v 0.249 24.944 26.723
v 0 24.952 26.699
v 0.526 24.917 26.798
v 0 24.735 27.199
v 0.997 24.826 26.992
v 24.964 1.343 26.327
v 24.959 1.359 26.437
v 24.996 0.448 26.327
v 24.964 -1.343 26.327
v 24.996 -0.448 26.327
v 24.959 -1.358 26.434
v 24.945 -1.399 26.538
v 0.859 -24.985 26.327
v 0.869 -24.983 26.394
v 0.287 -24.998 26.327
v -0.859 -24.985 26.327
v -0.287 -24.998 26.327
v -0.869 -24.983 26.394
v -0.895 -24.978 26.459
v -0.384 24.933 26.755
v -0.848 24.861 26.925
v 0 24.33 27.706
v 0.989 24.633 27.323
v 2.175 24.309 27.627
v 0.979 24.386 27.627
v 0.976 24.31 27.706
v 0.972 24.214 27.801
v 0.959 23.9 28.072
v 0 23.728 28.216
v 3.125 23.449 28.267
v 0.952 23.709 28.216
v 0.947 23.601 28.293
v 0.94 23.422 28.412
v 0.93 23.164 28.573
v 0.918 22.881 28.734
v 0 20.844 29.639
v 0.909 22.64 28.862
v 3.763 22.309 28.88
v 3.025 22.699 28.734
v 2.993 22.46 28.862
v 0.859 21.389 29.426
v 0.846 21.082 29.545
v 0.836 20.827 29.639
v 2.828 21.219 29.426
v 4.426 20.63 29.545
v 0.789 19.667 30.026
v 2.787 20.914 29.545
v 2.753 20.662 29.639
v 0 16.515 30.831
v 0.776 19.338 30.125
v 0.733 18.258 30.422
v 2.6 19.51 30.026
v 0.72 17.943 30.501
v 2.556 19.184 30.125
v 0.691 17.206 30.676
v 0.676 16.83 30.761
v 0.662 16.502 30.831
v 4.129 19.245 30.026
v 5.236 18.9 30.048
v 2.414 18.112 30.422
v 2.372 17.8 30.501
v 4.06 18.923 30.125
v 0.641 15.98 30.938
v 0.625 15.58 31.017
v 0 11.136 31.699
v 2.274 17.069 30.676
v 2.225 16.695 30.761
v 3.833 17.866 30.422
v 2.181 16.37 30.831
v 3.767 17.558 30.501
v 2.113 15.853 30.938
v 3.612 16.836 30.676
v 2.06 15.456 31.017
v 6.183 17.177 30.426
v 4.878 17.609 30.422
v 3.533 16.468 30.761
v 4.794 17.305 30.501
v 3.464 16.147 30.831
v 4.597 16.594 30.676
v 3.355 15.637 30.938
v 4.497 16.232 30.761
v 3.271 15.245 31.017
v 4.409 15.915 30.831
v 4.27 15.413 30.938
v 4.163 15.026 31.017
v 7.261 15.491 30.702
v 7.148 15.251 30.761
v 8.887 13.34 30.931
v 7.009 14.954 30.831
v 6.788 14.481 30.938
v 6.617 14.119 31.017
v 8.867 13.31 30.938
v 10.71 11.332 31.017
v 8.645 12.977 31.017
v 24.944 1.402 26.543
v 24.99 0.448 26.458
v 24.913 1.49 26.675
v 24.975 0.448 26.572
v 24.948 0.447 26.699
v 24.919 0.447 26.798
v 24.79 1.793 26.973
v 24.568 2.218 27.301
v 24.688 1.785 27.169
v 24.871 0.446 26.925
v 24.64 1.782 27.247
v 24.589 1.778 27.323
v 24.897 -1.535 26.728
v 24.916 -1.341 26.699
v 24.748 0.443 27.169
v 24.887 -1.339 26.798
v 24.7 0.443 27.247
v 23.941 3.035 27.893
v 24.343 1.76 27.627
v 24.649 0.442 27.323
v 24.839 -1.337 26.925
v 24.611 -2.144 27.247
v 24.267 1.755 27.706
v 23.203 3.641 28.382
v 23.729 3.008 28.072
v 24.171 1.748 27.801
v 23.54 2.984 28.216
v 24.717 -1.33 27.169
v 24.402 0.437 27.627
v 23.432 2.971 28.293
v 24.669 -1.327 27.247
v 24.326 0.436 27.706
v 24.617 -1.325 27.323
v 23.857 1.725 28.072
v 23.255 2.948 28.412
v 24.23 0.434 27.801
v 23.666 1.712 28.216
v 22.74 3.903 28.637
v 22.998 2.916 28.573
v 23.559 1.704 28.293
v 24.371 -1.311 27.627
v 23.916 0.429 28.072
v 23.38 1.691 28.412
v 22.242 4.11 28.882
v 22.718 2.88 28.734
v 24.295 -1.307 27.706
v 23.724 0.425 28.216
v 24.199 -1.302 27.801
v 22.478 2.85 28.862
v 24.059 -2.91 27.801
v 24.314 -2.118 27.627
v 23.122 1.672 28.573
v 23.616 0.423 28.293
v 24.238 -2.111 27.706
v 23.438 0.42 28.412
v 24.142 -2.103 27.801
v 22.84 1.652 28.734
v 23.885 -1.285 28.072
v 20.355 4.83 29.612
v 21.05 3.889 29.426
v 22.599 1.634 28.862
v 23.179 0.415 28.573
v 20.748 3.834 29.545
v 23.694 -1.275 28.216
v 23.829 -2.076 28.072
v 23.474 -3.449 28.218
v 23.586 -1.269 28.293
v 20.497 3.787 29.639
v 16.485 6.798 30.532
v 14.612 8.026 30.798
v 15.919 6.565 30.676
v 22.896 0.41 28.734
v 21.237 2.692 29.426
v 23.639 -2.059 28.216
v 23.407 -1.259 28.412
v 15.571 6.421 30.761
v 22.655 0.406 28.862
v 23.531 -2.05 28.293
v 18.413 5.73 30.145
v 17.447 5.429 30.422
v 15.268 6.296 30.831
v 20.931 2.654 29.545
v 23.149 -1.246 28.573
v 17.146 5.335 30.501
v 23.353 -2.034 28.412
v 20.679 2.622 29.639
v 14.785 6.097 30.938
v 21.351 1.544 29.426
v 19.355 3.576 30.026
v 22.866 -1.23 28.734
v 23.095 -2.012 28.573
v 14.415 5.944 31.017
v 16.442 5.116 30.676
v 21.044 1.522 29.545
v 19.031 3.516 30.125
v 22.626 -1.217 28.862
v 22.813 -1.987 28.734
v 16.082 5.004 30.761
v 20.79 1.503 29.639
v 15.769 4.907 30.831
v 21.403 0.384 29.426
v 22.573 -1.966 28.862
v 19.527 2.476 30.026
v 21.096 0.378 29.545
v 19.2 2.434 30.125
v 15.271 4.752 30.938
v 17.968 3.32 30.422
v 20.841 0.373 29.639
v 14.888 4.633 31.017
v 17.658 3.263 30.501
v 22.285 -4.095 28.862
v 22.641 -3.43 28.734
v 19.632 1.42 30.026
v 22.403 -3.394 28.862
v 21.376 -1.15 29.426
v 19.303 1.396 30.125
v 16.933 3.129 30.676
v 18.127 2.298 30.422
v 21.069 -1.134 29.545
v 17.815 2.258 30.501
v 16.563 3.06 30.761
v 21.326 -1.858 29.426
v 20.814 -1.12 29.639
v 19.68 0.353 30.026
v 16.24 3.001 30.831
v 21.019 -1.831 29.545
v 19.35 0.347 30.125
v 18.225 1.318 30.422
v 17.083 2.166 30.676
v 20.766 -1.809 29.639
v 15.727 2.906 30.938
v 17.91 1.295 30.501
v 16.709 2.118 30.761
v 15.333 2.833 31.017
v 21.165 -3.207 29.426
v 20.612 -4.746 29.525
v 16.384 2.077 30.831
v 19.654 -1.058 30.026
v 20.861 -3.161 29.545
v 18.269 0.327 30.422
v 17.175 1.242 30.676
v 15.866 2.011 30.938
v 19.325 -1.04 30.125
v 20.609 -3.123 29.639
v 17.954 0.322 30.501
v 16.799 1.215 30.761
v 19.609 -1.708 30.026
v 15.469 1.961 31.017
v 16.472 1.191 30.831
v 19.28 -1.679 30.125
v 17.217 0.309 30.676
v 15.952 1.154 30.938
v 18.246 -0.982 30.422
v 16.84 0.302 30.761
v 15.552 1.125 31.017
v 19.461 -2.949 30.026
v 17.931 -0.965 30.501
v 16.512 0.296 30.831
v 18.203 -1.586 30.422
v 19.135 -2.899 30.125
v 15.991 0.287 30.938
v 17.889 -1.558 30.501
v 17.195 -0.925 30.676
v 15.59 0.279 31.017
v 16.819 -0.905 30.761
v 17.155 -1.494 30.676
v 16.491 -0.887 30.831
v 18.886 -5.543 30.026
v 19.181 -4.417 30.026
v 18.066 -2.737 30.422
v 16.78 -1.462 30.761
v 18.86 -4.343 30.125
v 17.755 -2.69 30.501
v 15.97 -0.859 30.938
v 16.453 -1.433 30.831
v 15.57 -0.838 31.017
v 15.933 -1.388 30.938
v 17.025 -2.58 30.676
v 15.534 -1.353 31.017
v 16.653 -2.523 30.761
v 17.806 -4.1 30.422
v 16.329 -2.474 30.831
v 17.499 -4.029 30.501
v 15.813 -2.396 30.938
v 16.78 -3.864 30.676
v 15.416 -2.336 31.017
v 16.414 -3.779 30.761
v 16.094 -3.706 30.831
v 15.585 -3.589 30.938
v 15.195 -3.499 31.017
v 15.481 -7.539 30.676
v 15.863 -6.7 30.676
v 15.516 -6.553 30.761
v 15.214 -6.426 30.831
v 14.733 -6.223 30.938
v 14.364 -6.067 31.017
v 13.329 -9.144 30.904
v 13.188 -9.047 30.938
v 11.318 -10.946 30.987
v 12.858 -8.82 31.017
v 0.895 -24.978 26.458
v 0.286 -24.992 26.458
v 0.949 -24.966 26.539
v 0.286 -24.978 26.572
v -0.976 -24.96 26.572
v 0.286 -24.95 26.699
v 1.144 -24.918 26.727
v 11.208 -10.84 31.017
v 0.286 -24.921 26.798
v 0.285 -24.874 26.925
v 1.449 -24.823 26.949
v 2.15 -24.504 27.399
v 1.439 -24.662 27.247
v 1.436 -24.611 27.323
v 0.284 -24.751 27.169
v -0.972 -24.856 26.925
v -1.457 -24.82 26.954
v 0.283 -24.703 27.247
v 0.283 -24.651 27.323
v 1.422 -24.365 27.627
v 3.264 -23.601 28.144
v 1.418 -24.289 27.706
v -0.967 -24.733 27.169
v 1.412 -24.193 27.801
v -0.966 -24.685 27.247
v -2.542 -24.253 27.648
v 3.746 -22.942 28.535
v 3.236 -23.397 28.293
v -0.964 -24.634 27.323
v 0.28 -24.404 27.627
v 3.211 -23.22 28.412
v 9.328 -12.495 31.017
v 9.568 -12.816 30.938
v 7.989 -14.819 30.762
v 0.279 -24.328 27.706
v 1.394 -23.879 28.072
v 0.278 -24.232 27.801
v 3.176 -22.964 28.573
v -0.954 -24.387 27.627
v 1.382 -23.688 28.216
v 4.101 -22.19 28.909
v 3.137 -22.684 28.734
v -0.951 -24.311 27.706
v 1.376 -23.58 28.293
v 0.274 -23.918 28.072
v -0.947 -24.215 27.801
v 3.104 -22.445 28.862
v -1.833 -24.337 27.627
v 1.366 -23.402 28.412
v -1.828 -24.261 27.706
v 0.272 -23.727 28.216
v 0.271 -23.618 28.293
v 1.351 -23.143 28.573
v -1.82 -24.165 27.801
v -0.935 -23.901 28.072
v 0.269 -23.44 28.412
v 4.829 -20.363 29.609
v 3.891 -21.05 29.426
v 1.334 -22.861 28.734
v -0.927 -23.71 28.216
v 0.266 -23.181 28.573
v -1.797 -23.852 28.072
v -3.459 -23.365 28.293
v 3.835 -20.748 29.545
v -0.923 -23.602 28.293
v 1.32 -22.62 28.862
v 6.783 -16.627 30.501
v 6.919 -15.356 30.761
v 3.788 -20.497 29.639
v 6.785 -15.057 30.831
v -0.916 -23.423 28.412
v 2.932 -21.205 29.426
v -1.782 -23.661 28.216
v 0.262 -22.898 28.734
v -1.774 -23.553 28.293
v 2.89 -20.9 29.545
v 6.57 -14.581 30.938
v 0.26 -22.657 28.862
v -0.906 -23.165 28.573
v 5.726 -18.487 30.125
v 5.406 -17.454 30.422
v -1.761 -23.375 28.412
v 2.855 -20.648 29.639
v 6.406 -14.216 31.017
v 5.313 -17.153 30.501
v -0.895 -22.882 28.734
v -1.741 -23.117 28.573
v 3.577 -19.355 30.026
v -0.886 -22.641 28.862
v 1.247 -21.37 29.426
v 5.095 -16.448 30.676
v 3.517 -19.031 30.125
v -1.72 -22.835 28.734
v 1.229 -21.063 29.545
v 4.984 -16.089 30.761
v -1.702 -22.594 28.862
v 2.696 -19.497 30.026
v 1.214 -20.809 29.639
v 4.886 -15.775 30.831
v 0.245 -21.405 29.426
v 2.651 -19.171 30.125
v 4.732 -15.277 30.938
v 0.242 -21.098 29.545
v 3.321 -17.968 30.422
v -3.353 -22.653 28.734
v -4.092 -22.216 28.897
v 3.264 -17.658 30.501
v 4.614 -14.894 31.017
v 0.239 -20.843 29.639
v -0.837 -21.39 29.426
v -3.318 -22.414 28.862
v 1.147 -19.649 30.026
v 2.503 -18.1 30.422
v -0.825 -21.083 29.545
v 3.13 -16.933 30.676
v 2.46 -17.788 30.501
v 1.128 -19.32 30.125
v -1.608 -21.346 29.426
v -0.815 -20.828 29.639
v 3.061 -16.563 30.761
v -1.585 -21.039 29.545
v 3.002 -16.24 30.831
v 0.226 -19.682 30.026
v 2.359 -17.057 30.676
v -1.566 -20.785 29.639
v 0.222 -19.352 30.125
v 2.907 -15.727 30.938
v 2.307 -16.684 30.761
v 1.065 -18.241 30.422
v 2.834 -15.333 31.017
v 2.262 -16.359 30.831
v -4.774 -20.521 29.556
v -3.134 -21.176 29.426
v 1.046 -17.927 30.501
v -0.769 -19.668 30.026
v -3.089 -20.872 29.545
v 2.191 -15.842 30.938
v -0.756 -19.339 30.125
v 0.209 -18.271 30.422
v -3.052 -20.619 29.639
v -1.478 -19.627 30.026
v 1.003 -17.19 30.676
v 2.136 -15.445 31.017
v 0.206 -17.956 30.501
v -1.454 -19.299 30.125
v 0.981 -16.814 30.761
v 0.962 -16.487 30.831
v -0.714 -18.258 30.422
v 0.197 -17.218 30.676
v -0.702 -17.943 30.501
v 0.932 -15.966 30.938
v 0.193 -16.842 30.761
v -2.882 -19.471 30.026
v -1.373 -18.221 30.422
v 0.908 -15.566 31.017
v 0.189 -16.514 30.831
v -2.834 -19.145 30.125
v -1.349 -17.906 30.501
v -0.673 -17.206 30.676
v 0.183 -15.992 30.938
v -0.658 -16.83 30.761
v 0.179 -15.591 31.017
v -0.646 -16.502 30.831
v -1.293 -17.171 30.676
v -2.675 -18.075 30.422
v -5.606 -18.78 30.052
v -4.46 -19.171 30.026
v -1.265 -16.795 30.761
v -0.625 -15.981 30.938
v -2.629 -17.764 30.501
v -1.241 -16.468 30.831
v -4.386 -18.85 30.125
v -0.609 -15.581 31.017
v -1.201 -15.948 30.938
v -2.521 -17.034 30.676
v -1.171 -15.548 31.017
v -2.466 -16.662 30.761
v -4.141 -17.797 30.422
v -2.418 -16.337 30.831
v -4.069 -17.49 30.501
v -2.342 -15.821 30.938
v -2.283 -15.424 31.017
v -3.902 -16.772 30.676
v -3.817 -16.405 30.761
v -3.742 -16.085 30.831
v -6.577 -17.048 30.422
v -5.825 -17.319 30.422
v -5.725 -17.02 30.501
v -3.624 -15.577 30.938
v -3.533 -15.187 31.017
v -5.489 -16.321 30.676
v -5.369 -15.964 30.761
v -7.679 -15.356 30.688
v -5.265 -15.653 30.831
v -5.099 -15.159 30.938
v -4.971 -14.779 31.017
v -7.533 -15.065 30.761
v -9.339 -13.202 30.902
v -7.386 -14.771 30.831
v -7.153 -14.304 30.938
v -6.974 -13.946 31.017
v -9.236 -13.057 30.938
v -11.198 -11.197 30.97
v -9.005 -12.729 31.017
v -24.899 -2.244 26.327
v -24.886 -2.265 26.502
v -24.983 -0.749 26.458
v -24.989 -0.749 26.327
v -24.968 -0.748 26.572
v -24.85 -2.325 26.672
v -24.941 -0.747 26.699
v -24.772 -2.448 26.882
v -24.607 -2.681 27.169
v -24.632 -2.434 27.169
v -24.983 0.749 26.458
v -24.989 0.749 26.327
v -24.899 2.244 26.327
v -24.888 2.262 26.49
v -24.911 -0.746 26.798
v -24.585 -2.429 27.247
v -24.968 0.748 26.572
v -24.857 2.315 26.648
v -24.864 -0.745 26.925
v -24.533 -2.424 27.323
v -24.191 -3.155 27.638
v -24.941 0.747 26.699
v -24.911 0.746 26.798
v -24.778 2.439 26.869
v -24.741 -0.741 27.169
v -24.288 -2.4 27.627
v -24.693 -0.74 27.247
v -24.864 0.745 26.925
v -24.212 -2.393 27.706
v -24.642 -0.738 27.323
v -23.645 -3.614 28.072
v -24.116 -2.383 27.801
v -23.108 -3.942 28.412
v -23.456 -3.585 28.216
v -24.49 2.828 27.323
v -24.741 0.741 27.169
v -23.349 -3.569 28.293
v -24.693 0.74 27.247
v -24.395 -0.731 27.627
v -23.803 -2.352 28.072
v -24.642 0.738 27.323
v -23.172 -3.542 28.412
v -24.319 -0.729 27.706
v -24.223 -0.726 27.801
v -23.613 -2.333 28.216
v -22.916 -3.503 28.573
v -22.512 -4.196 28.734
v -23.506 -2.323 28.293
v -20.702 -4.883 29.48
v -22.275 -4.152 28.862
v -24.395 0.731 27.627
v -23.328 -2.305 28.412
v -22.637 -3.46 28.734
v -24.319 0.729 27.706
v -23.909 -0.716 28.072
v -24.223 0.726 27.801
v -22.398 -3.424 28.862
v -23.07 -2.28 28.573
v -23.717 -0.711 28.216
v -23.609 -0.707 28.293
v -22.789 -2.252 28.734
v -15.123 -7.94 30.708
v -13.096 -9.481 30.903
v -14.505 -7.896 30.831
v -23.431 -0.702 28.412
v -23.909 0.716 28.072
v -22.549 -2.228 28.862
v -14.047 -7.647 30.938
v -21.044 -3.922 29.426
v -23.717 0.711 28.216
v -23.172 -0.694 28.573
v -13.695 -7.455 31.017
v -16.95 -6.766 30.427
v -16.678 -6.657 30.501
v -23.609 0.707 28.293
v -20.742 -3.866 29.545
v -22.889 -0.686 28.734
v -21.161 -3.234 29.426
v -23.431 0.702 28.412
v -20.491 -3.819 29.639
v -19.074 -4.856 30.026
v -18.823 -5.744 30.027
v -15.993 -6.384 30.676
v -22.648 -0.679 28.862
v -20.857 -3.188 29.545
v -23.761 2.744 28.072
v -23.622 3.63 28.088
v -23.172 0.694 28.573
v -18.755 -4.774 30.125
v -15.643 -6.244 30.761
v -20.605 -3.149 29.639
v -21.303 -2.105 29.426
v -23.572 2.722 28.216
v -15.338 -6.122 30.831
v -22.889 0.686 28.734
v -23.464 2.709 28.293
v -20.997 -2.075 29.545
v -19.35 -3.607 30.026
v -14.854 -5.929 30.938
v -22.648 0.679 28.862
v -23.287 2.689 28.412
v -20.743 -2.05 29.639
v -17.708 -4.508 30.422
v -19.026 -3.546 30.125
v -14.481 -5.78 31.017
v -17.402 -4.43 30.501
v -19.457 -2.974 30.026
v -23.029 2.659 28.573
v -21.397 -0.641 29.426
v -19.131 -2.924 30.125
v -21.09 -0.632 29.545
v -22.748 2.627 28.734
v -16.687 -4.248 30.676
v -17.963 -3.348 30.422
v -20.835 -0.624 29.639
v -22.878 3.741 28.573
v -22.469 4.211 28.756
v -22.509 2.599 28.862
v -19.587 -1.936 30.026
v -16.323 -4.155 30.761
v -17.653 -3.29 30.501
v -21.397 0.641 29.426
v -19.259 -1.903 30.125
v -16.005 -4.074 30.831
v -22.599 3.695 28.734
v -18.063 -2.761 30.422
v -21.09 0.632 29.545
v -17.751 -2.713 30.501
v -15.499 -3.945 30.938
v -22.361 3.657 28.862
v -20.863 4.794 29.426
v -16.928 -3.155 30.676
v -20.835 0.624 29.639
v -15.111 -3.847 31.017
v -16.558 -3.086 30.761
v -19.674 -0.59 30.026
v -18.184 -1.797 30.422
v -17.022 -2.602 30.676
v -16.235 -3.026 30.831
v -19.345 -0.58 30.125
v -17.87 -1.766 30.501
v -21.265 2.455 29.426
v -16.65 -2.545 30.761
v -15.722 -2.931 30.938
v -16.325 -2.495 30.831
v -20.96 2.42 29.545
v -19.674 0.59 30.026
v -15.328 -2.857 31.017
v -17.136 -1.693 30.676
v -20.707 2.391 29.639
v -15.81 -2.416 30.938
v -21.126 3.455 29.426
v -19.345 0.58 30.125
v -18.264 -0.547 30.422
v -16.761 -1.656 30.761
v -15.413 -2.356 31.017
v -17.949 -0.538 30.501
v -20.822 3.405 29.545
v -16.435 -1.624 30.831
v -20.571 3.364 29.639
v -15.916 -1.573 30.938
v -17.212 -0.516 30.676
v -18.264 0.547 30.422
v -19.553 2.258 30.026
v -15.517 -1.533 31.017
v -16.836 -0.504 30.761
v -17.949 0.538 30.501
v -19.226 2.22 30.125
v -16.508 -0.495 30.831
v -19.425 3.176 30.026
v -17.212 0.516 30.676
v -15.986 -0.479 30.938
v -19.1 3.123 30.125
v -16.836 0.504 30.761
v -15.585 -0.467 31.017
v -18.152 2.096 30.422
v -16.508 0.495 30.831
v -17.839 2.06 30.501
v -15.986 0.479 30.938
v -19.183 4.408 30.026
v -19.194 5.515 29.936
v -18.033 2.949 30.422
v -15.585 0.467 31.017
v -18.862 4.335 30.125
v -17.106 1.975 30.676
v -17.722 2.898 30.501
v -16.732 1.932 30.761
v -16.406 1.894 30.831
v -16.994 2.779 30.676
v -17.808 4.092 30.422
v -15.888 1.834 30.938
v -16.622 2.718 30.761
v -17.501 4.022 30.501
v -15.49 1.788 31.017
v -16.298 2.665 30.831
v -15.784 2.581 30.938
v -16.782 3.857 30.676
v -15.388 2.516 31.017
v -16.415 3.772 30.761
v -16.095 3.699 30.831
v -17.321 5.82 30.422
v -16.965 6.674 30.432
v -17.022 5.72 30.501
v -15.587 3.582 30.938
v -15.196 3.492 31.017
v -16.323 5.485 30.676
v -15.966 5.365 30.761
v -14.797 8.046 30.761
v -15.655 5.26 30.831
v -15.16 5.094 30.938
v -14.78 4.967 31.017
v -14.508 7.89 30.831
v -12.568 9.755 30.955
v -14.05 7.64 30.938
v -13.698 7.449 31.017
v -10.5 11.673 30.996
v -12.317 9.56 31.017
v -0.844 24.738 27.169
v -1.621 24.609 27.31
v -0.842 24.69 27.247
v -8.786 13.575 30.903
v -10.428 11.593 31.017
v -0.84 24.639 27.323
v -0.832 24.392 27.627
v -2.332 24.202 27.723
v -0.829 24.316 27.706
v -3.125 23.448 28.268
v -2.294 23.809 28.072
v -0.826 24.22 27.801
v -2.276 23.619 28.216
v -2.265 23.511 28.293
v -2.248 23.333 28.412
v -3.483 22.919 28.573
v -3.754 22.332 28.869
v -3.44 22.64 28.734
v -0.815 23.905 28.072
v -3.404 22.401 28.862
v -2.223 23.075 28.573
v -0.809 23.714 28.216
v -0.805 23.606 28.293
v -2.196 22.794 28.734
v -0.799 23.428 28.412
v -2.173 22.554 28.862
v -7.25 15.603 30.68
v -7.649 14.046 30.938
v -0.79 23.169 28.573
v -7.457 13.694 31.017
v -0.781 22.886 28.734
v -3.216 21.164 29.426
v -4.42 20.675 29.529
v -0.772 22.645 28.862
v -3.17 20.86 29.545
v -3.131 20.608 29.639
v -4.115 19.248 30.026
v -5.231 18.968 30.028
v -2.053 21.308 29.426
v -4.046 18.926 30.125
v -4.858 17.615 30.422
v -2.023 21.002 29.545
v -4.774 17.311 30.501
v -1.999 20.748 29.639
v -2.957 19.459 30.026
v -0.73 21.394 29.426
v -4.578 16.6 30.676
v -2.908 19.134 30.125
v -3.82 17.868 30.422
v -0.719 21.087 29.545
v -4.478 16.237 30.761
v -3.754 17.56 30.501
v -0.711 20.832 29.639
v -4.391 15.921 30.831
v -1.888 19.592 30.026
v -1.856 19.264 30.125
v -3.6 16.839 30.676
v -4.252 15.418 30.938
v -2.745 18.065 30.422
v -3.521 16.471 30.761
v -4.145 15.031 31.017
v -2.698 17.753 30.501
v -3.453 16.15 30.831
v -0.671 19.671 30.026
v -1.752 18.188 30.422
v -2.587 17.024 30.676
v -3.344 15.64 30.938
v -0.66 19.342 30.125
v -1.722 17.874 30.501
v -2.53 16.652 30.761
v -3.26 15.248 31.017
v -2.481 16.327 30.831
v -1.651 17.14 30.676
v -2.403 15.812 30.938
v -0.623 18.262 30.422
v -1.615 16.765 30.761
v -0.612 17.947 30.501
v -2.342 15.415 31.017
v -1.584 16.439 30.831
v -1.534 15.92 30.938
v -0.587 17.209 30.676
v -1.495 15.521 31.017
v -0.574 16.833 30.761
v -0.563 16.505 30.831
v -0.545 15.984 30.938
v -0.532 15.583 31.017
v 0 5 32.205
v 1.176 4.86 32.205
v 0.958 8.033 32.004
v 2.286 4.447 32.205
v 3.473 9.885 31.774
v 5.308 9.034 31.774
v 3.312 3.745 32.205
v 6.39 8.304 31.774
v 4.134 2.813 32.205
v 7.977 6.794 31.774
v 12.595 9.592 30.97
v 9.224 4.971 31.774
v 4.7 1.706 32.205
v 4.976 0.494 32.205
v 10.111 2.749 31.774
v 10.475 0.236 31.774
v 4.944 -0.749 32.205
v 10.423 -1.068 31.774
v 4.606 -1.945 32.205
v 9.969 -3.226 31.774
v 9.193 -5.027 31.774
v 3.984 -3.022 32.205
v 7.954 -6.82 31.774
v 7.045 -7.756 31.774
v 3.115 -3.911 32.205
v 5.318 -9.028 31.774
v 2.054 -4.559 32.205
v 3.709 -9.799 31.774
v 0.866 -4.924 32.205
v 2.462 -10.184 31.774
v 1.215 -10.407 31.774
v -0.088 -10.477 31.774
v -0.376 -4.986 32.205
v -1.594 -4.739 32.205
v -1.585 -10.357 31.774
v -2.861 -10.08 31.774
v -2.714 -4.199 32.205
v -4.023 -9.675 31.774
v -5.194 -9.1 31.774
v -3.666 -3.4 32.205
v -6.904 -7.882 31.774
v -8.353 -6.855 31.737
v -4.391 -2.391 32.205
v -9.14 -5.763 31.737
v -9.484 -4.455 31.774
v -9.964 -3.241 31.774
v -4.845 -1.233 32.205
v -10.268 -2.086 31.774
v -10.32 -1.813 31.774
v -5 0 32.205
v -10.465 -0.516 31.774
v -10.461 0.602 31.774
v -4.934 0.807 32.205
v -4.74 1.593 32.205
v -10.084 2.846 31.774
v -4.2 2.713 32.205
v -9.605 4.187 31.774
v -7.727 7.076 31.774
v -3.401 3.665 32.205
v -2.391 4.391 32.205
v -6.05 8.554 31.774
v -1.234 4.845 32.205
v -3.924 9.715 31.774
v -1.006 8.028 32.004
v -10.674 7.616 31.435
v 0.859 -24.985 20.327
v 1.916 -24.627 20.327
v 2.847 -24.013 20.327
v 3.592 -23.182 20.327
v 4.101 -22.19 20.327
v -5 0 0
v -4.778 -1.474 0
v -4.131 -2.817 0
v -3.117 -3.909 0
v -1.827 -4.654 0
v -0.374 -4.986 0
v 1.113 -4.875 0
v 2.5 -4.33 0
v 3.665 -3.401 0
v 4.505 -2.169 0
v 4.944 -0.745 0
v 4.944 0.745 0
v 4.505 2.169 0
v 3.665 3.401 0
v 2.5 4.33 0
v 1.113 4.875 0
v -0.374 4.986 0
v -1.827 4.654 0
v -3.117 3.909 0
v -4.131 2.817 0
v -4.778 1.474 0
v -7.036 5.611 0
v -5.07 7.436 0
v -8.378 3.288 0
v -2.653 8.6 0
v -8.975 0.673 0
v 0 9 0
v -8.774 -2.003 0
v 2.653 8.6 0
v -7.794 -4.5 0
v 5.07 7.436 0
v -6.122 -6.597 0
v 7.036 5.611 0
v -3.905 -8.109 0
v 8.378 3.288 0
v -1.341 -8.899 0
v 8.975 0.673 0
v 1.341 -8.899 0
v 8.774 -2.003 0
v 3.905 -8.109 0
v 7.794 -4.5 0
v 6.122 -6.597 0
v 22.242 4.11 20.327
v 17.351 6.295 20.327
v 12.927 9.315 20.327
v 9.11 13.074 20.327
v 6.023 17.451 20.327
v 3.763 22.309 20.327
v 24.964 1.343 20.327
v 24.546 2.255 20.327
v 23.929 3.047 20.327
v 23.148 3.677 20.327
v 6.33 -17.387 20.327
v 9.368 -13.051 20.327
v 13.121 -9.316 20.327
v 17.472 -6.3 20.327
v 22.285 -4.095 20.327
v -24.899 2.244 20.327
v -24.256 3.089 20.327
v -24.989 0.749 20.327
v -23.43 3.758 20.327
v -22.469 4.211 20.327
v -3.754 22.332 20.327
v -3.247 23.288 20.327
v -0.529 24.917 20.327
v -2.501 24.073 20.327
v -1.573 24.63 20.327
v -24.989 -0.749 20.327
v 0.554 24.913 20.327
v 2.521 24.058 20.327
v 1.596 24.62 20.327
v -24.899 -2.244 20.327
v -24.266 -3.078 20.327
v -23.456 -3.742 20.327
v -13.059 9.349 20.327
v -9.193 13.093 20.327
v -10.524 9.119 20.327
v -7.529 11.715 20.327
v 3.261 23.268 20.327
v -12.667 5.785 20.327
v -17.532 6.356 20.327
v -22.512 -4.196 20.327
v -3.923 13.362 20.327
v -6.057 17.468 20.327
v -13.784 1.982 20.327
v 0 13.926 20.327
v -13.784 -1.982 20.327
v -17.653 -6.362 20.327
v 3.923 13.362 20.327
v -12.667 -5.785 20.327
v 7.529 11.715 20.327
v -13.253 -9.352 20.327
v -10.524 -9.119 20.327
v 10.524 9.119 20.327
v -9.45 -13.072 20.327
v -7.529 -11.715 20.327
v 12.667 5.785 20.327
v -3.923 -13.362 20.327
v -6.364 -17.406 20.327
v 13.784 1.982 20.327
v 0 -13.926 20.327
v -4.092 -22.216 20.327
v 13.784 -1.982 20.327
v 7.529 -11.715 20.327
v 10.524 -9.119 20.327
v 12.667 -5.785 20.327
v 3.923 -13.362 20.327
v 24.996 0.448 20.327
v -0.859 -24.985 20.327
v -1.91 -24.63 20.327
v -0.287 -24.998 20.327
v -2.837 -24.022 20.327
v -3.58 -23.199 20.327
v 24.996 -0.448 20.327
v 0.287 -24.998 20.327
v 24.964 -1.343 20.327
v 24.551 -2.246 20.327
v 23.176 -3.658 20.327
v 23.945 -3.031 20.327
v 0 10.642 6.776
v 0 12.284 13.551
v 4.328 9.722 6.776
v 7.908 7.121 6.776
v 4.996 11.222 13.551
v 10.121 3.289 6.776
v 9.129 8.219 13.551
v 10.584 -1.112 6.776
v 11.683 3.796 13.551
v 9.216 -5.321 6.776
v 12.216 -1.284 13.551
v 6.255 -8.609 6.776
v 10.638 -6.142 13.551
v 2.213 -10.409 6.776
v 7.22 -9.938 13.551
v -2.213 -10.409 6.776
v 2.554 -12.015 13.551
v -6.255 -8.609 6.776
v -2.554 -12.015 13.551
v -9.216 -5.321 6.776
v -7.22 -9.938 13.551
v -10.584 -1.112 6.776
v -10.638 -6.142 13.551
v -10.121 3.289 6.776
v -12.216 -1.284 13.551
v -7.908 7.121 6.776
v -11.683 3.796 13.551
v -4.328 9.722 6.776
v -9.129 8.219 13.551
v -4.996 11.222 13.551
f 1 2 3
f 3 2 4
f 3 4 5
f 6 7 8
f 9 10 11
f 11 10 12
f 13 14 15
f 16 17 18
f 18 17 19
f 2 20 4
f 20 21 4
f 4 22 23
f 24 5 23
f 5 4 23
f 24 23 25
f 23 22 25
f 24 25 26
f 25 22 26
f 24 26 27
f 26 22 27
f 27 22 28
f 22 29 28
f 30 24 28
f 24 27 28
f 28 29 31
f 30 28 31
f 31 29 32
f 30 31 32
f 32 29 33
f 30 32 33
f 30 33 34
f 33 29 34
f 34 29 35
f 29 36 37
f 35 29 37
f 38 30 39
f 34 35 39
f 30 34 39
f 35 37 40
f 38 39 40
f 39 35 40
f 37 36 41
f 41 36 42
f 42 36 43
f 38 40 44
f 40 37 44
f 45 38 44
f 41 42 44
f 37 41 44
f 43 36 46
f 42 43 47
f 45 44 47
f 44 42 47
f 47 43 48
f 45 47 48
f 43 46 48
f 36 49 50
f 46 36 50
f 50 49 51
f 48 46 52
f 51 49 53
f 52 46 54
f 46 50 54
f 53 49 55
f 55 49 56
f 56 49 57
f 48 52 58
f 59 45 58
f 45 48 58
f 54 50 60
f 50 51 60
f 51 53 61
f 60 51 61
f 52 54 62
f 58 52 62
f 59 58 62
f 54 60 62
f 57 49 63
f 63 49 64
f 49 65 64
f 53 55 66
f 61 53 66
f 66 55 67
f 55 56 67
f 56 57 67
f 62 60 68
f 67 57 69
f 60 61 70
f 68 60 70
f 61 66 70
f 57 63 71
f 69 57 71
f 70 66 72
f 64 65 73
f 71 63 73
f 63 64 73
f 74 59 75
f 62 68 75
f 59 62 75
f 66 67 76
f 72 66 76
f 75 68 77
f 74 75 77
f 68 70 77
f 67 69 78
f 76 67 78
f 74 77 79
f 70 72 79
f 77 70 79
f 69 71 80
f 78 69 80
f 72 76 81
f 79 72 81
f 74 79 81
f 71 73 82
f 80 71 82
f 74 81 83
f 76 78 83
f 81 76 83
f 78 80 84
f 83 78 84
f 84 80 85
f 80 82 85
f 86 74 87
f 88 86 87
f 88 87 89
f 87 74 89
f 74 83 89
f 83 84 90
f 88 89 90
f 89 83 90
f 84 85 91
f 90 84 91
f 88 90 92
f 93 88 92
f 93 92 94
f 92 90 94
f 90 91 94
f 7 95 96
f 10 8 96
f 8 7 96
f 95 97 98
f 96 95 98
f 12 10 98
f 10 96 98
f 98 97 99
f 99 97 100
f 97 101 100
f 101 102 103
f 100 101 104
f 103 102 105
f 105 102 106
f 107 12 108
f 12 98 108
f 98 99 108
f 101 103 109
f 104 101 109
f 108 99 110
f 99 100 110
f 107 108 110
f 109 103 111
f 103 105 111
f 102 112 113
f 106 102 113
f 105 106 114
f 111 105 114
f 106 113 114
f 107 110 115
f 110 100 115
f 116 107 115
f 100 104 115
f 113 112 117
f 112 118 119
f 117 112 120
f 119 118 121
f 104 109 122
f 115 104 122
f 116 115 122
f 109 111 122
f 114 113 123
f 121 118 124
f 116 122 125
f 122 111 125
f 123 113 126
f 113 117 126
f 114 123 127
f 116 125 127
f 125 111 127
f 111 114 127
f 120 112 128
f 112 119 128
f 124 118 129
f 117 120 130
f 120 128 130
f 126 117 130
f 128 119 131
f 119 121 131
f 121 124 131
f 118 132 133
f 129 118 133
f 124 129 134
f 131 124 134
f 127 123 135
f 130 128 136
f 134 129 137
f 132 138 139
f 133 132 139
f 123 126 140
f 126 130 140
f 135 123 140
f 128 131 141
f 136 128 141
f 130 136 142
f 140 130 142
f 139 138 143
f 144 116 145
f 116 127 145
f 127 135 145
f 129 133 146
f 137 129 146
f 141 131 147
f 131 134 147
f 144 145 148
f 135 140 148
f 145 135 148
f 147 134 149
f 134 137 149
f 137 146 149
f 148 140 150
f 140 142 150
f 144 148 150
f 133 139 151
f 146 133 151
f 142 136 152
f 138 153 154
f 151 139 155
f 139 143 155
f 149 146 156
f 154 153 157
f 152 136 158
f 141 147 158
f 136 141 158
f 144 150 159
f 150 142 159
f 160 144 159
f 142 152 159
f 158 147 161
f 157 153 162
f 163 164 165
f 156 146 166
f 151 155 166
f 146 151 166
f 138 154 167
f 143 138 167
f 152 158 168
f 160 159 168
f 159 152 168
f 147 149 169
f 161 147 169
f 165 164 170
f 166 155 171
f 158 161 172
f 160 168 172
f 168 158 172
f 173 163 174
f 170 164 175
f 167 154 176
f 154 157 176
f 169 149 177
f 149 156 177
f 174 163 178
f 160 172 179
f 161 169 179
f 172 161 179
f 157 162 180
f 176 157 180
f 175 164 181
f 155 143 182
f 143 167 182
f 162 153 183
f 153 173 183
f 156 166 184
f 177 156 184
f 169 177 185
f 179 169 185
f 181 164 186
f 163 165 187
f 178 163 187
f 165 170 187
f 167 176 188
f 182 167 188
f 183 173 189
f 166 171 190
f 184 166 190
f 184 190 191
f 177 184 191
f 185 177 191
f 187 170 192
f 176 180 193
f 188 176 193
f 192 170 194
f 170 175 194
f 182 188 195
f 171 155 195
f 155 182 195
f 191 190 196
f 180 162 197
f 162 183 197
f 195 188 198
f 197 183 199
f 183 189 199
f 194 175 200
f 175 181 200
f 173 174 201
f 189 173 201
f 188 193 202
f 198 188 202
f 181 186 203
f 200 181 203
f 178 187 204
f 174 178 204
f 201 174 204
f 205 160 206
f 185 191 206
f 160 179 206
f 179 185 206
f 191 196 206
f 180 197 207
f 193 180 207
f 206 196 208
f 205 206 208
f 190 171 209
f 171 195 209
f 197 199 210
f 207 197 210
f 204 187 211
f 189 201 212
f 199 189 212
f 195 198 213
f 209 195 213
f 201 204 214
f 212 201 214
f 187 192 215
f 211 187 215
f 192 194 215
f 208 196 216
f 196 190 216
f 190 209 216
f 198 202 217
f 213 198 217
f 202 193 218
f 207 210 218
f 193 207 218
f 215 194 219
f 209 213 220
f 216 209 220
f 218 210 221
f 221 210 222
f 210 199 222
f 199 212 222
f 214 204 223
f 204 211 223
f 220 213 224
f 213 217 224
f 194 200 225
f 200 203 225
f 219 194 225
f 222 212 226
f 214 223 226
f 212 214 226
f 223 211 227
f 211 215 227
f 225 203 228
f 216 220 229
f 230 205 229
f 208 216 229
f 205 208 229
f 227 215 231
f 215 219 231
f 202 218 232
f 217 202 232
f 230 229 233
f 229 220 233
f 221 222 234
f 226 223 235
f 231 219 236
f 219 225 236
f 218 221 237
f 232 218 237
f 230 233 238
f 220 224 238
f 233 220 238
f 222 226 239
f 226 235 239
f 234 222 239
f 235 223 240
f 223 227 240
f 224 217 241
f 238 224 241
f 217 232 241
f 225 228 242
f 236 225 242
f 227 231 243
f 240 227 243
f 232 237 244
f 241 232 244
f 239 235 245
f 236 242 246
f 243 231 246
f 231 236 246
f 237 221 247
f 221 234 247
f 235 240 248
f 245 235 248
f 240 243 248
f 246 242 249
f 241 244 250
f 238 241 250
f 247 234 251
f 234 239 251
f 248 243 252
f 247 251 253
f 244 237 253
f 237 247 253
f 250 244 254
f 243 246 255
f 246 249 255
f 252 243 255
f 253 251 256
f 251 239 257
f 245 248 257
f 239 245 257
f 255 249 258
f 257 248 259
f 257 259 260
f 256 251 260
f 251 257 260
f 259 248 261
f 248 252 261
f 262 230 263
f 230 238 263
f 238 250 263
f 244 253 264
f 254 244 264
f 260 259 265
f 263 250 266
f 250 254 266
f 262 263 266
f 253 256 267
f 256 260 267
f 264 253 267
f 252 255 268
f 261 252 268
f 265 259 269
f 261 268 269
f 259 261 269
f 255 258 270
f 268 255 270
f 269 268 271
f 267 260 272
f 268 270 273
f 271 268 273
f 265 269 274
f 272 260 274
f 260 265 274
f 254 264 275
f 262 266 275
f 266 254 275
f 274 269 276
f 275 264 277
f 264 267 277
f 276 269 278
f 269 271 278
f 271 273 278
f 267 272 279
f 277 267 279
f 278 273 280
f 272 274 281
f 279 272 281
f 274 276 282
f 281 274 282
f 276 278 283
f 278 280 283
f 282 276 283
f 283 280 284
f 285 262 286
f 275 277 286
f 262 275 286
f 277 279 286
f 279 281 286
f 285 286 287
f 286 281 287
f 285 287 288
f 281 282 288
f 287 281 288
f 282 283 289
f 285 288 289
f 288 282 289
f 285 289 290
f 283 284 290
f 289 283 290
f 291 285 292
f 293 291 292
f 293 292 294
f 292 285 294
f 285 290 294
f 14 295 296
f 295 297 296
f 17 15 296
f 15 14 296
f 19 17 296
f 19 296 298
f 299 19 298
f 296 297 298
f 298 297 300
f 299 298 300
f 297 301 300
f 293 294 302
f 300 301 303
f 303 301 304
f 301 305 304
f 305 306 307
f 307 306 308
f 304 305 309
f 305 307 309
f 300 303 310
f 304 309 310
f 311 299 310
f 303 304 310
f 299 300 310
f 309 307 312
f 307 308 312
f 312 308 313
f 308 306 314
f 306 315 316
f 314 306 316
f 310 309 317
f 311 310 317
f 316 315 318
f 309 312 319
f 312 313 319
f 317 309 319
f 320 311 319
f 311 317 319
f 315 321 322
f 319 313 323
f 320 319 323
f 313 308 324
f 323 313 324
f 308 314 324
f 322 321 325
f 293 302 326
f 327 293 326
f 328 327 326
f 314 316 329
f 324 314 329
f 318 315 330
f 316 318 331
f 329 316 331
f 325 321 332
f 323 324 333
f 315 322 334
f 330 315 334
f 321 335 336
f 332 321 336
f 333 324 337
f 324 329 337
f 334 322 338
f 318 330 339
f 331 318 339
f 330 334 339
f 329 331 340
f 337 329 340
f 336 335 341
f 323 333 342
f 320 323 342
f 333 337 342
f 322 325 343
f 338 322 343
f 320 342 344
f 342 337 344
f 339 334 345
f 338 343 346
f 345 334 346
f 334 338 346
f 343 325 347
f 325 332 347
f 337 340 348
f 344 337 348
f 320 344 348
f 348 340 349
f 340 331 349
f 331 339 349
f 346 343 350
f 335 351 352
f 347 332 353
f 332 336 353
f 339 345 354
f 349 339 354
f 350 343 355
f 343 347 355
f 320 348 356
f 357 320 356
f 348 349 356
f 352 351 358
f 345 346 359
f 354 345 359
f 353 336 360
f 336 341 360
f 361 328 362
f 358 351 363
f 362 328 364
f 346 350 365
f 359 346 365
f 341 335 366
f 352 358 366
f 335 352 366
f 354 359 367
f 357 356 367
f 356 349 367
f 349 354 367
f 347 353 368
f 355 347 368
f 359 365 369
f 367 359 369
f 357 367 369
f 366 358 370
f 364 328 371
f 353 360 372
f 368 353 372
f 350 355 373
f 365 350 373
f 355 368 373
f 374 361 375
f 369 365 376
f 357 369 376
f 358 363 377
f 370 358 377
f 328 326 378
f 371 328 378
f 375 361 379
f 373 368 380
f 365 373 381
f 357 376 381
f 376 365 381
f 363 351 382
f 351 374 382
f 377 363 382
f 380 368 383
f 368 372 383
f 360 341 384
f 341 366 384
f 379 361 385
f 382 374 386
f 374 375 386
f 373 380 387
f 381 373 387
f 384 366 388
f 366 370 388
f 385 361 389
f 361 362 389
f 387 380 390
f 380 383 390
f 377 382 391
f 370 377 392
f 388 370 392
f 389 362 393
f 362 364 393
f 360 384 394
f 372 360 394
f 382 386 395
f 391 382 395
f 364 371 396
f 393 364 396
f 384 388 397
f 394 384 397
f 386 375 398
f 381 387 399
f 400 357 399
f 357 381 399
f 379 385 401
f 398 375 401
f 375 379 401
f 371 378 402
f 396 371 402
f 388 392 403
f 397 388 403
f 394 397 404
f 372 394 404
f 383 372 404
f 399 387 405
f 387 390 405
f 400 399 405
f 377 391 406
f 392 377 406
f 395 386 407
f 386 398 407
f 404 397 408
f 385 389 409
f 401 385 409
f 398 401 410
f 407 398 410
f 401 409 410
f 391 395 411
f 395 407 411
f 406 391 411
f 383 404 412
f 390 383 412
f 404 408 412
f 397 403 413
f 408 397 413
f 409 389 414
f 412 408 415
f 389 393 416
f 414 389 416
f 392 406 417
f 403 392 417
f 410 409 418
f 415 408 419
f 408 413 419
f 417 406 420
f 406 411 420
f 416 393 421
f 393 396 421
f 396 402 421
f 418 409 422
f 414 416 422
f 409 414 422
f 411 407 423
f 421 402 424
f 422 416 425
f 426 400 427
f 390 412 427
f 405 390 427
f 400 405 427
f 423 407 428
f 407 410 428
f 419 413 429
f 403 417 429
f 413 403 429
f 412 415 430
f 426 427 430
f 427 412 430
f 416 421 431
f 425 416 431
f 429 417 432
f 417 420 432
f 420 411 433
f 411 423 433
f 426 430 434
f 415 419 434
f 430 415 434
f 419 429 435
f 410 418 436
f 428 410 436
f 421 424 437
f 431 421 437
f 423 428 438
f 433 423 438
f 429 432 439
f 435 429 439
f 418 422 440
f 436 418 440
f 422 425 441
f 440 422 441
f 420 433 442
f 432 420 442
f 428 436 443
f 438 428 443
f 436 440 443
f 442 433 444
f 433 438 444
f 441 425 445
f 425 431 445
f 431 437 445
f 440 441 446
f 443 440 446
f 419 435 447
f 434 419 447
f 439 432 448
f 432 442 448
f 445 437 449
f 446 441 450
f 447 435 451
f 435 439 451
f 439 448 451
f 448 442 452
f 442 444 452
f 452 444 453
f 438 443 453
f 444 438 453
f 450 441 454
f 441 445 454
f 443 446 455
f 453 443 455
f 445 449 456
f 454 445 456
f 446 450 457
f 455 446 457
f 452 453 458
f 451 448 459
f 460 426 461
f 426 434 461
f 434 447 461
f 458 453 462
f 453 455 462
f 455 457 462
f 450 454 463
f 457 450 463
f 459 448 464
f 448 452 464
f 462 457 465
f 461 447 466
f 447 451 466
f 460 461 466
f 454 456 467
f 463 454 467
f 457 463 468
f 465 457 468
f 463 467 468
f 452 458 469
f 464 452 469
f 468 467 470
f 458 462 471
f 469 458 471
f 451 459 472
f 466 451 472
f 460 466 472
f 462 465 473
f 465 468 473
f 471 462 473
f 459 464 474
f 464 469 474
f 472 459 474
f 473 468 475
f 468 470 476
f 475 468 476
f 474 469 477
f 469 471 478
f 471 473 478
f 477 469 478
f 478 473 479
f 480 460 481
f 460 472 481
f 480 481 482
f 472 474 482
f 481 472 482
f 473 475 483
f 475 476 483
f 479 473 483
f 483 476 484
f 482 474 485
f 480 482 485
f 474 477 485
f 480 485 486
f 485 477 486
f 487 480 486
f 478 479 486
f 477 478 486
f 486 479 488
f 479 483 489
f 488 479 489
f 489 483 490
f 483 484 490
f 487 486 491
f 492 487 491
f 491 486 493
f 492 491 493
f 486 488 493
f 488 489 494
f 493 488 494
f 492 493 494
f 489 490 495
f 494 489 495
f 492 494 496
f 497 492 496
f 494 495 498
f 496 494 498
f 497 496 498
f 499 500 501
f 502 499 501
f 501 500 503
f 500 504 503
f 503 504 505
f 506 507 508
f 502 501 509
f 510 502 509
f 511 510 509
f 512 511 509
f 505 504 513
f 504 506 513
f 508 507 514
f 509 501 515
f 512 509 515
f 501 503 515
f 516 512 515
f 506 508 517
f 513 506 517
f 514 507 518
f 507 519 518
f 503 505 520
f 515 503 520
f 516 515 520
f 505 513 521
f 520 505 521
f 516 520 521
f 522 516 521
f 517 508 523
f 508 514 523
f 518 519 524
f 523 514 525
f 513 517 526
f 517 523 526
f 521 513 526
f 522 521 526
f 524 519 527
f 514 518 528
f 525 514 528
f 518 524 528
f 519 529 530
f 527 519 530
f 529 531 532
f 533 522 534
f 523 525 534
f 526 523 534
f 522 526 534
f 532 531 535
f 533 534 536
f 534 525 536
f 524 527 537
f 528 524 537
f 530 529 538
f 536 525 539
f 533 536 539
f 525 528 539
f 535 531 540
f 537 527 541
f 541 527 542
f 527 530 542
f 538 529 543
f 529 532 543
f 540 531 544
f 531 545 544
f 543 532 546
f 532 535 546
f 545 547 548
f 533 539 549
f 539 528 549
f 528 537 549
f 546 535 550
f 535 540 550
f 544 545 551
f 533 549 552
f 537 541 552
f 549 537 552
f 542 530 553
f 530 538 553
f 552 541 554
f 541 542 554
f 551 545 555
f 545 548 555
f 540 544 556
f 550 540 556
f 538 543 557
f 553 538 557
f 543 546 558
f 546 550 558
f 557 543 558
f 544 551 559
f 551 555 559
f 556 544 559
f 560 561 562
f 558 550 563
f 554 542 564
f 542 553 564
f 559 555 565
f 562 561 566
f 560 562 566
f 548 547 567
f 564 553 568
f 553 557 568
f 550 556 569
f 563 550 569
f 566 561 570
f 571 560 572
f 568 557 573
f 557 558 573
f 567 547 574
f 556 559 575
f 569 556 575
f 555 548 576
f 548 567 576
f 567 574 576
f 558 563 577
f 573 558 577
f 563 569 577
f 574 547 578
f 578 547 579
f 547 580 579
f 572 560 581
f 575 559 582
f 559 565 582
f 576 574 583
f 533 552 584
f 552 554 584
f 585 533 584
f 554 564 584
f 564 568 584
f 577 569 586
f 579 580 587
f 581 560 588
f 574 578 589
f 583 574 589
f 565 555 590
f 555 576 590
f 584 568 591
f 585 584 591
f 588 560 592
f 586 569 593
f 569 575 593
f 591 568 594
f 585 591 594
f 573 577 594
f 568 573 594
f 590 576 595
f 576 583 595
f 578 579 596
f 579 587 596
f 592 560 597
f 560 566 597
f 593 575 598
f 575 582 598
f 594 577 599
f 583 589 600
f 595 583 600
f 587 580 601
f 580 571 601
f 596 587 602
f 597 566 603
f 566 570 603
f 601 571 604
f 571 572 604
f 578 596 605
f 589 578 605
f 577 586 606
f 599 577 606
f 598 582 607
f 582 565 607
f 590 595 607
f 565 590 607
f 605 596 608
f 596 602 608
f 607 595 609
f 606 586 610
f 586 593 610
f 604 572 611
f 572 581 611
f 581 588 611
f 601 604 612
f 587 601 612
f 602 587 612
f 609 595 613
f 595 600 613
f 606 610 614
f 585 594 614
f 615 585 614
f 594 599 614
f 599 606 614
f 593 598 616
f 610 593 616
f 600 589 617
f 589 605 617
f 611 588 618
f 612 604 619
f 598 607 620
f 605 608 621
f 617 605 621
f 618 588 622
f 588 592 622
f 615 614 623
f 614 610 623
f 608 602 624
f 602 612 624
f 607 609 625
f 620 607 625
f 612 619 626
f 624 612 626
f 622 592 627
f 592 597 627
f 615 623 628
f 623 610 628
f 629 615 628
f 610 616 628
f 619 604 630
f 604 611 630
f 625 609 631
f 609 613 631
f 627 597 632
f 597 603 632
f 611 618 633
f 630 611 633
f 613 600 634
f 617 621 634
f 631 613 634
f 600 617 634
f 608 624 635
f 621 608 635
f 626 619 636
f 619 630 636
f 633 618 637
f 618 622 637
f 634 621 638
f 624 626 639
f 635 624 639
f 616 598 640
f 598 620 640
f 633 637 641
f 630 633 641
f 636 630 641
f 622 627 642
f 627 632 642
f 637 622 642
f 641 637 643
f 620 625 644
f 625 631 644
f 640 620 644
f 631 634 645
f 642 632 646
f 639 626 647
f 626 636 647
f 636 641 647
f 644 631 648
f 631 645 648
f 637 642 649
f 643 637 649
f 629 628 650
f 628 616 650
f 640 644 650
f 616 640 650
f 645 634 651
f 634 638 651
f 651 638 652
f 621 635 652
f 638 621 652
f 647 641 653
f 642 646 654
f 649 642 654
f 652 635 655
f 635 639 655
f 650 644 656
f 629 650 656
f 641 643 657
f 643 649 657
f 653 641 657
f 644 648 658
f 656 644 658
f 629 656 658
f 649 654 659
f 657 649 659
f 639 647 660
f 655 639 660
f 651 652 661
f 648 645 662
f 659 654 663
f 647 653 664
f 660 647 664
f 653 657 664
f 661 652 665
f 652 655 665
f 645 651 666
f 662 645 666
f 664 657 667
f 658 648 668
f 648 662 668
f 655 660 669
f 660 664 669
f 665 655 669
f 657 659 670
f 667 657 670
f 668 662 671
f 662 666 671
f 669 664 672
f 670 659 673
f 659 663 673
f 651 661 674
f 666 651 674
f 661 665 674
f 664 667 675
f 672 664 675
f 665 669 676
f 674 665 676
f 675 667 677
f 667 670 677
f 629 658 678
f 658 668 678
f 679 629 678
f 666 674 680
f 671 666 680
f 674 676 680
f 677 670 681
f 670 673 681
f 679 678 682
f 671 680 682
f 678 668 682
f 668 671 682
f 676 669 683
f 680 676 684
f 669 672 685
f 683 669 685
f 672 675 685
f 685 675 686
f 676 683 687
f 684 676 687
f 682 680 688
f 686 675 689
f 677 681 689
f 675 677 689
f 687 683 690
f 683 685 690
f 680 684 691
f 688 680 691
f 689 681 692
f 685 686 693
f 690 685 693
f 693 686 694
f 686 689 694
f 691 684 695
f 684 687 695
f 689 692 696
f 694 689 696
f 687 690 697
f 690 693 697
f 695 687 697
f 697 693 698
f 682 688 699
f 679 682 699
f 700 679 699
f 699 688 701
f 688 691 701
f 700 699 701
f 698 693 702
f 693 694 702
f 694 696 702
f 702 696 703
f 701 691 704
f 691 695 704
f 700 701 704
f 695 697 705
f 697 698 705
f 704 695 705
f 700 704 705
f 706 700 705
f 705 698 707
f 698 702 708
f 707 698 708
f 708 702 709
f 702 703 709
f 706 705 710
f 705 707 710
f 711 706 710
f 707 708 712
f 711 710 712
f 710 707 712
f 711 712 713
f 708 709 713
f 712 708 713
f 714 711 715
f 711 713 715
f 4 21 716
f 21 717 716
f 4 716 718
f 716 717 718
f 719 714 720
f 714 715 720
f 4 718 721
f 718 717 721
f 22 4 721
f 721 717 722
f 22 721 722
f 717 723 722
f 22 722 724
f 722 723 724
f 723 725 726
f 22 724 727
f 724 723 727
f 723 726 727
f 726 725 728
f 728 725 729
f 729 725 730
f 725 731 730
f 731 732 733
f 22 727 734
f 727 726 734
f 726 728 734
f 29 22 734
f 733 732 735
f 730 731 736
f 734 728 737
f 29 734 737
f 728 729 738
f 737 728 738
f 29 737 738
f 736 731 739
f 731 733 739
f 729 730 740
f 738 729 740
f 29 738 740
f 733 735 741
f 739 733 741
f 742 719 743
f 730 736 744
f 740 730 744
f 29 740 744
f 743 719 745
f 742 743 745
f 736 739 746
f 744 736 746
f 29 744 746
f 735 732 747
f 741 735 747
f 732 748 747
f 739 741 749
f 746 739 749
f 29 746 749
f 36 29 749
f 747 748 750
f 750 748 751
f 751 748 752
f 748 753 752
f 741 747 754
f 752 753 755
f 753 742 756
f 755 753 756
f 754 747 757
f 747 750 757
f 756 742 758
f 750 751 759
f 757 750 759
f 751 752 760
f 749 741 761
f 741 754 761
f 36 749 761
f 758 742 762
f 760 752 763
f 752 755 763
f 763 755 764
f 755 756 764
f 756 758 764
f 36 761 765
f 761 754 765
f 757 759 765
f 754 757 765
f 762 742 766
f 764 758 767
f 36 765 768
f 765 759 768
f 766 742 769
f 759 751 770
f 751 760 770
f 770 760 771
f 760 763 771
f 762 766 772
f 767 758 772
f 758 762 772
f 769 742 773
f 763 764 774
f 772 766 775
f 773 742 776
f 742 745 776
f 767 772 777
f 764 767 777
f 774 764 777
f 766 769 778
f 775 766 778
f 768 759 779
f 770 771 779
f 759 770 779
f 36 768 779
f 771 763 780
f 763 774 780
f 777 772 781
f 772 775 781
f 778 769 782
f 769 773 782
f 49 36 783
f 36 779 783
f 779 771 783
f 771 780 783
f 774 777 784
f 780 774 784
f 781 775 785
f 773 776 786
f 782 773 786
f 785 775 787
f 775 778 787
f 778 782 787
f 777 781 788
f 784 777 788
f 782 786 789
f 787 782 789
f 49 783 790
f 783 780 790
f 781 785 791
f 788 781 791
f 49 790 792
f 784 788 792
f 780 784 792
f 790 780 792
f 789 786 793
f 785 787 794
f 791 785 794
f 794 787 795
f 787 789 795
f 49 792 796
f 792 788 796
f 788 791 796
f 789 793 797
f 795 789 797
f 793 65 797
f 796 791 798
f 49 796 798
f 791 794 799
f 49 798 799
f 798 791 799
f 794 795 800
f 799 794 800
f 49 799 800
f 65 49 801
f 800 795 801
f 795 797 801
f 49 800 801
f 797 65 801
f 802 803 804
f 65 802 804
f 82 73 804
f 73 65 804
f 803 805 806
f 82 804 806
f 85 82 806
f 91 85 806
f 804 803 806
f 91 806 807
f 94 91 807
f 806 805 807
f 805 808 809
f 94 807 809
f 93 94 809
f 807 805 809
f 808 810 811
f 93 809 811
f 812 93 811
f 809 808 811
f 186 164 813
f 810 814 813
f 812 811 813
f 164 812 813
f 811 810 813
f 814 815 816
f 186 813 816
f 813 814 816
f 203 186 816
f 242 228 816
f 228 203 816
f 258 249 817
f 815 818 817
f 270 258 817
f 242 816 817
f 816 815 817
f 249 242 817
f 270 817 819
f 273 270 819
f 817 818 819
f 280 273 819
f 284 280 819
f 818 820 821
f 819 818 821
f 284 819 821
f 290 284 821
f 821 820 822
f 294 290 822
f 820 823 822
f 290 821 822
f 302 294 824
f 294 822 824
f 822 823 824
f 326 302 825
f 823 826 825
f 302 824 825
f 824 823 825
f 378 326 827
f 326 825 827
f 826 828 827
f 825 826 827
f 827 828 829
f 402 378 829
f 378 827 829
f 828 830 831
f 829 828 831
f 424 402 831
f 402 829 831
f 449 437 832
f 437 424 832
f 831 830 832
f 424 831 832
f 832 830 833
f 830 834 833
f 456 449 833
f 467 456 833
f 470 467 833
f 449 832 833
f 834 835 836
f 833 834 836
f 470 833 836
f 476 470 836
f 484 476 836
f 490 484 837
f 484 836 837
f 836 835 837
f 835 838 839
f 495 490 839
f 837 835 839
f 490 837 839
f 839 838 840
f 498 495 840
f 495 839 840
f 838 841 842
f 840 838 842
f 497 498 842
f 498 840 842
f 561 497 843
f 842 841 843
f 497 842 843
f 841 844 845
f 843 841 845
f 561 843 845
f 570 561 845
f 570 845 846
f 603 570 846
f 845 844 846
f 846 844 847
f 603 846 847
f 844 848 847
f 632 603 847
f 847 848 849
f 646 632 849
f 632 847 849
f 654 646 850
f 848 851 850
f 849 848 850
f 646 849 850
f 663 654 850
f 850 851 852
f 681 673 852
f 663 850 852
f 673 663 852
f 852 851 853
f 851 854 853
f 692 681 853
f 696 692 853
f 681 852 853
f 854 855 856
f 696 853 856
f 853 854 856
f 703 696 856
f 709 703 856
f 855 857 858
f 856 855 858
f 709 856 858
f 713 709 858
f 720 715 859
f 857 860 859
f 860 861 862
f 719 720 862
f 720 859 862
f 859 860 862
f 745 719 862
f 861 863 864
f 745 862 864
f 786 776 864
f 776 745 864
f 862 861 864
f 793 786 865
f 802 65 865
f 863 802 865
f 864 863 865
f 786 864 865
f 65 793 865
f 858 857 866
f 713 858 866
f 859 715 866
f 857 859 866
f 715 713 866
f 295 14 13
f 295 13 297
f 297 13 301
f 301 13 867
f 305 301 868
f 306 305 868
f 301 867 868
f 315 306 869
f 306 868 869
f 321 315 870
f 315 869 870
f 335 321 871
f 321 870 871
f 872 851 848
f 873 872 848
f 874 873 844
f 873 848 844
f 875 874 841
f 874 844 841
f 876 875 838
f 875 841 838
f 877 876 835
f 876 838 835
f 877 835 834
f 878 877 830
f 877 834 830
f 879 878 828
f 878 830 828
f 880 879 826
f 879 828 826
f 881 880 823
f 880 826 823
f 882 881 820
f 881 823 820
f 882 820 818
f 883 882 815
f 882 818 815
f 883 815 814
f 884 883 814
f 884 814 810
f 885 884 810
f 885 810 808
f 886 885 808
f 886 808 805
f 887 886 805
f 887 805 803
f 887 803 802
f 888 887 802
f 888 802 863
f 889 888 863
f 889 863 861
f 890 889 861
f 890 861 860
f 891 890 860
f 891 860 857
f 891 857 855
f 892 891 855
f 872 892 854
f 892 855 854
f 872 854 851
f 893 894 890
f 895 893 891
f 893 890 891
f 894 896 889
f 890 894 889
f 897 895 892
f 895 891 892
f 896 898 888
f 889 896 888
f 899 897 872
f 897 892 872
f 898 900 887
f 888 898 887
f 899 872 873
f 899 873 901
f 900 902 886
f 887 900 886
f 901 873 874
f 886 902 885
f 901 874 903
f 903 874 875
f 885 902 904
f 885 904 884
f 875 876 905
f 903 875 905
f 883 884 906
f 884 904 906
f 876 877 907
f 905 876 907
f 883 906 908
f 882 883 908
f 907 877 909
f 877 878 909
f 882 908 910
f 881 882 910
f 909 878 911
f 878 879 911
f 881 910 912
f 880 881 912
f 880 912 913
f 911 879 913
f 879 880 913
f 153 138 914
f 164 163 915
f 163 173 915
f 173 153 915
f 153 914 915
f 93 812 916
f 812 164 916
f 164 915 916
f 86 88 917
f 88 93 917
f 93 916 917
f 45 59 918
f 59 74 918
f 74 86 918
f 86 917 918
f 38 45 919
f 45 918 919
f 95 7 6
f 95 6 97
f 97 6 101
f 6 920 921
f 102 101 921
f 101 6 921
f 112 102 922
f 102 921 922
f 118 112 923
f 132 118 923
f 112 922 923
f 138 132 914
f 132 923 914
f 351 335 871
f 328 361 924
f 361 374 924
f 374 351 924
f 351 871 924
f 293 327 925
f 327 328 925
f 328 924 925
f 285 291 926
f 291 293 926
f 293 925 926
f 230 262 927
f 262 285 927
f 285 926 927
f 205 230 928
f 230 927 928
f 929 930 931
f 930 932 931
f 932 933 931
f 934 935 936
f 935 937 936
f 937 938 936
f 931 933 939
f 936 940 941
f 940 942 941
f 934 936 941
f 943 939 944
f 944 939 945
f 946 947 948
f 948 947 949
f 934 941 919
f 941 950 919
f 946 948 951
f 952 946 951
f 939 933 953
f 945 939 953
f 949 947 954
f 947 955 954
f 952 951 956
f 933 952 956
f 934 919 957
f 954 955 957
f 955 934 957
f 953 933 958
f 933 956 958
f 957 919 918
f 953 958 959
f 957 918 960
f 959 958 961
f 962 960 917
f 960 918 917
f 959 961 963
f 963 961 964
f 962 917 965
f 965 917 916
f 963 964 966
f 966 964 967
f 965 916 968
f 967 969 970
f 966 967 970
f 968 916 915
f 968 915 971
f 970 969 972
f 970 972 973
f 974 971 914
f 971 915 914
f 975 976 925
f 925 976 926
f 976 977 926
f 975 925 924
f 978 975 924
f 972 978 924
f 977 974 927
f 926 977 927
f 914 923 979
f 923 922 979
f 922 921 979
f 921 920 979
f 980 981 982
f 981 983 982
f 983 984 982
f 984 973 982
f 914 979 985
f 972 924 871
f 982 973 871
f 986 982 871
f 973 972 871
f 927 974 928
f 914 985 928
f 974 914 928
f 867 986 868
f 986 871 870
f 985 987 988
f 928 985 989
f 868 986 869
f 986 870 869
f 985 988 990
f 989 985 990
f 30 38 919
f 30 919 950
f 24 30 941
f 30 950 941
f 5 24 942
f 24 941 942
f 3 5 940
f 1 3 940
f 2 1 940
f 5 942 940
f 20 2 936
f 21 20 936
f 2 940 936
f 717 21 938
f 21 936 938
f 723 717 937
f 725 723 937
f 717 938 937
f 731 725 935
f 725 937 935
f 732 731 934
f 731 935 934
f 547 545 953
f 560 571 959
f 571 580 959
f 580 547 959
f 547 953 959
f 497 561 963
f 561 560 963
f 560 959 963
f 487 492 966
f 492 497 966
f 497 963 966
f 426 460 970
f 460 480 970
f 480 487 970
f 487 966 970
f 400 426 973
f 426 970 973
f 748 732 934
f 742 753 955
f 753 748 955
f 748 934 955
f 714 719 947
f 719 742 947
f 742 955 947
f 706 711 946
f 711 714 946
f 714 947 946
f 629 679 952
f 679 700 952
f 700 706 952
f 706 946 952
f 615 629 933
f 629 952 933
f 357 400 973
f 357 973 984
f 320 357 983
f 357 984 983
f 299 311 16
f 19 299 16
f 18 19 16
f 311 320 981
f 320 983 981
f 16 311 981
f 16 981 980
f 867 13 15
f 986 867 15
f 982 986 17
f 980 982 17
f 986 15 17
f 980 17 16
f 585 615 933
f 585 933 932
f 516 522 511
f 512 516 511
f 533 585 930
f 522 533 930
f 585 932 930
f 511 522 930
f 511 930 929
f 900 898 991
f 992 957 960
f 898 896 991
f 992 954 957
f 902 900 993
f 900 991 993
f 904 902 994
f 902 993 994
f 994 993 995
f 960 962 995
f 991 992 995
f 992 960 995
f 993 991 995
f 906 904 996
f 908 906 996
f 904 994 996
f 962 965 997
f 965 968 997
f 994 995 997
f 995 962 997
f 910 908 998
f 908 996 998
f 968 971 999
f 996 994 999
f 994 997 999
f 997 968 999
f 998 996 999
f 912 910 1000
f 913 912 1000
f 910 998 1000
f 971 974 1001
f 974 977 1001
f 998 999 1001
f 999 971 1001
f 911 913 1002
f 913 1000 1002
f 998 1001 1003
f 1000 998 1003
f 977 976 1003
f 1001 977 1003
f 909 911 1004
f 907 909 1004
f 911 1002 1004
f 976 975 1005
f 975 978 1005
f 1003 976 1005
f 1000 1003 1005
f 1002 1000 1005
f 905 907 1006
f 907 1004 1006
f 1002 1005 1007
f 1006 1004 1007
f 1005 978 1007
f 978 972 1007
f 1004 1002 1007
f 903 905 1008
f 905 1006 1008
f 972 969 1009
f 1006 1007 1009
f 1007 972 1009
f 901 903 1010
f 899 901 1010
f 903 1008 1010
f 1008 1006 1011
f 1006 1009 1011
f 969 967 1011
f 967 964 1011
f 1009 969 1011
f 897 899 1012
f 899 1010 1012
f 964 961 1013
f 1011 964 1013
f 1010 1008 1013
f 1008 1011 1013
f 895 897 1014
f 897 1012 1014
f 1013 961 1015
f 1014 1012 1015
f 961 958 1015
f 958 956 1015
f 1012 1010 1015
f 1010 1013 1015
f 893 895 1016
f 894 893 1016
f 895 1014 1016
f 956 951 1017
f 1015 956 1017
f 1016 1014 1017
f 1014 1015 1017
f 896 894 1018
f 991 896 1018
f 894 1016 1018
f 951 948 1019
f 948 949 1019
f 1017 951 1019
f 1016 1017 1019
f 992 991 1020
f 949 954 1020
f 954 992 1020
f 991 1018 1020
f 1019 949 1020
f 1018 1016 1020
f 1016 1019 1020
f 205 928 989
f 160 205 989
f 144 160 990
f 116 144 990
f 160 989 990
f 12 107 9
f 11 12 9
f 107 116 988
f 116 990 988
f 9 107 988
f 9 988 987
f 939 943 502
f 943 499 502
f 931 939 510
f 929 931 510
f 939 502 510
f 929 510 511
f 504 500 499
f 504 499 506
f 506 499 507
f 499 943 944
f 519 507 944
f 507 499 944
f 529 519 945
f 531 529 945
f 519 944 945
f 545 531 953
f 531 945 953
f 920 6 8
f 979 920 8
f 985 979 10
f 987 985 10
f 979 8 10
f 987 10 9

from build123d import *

# Parameters (mm, degrees)
F3_DEPTH = 100
F5_D     = 10


with BuildPart() as f1:
    # F0 (on Right) → F1 (revolve)
    with BuildSketch(Plane.YZ):
        with BuildLine():
            Line((0, 32.3266497701), (0, 0))
            Line((0, 0), (9, 0))
            Line((9, 0), (13.925663583, 20.3266497701))
            Line((13.925663583, 20.3266497701), (25, 20.3266497701))
            Line((25, 20.3266497701), (25, 26.3266497701))
            add(Edge.make_bspline(
                [(25, 26.3266497701), (25, 32.3266497701), (0, 32.3266497701)],
                knots=[0, 0, 0, 1.5707963268, 1.5707963268, 1.5707963268], degree=2, weights=[1, 0.7071067812, 1]))
        make_face()
    revolve(axis=Axis((0, 0, 16.1633248851), (0, 0, -1)))

    # F2 (on Top) → F3 (intersect)
    with BuildSketch(Plane.XY):
        with BuildLine():
            ThreePointArc((-3.754235732, 22.3323114682), (-11.041772693, 11.1341950684), (-22.4685130723, 4.2106403335))
            ThreePointArc((-22.4685130723, 4.2106403335), (-25.5082976179, 0.022874934), (-22.51186286, -4.1960168477))
            ThreePointArc((-22.51186286, -4.1960168477), (-11.2684741638, -11.1275544115), (-4.0917559502, -22.2160492621))
            ThreePointArc((-4.0917559502, -22.2160492621), (0.0139431693, -25.0707596903), (4.1012988558, -22.1898465746))
            ThreePointArc((4.1012988558, -22.1898465746), (11.1616155781, -11.1006865584), (22.2852773965, -4.0948540004))
            ThreePointArc((22.2852773965, -4.0948540004), (25.1766523938, 0.0226602251), (22.2424904136, 4.1097944591))
            ThreePointArc((22.2424904136, 4.1097944591), (10.9343752254, 11.1089431069), (3.7628862808, 22.3085545833))
            ThreePointArc((3.7628862808, 22.3085545833), (0.0126414158, 24.9518154629), (-3.754235732, 22.3323114682))
        make_face()
    extrude(amount=F3_DEPTH, mode=Mode.INTERSECT)

    # F5 (through all)
    with Locations(Plane(origin=(0, 0, 0), x_dir=(1, 0, 0), z_dir=(0, 0, -1))):
        with Locations((0, 0)):
            Hole(F5_D / 2)


solid = f1.part
